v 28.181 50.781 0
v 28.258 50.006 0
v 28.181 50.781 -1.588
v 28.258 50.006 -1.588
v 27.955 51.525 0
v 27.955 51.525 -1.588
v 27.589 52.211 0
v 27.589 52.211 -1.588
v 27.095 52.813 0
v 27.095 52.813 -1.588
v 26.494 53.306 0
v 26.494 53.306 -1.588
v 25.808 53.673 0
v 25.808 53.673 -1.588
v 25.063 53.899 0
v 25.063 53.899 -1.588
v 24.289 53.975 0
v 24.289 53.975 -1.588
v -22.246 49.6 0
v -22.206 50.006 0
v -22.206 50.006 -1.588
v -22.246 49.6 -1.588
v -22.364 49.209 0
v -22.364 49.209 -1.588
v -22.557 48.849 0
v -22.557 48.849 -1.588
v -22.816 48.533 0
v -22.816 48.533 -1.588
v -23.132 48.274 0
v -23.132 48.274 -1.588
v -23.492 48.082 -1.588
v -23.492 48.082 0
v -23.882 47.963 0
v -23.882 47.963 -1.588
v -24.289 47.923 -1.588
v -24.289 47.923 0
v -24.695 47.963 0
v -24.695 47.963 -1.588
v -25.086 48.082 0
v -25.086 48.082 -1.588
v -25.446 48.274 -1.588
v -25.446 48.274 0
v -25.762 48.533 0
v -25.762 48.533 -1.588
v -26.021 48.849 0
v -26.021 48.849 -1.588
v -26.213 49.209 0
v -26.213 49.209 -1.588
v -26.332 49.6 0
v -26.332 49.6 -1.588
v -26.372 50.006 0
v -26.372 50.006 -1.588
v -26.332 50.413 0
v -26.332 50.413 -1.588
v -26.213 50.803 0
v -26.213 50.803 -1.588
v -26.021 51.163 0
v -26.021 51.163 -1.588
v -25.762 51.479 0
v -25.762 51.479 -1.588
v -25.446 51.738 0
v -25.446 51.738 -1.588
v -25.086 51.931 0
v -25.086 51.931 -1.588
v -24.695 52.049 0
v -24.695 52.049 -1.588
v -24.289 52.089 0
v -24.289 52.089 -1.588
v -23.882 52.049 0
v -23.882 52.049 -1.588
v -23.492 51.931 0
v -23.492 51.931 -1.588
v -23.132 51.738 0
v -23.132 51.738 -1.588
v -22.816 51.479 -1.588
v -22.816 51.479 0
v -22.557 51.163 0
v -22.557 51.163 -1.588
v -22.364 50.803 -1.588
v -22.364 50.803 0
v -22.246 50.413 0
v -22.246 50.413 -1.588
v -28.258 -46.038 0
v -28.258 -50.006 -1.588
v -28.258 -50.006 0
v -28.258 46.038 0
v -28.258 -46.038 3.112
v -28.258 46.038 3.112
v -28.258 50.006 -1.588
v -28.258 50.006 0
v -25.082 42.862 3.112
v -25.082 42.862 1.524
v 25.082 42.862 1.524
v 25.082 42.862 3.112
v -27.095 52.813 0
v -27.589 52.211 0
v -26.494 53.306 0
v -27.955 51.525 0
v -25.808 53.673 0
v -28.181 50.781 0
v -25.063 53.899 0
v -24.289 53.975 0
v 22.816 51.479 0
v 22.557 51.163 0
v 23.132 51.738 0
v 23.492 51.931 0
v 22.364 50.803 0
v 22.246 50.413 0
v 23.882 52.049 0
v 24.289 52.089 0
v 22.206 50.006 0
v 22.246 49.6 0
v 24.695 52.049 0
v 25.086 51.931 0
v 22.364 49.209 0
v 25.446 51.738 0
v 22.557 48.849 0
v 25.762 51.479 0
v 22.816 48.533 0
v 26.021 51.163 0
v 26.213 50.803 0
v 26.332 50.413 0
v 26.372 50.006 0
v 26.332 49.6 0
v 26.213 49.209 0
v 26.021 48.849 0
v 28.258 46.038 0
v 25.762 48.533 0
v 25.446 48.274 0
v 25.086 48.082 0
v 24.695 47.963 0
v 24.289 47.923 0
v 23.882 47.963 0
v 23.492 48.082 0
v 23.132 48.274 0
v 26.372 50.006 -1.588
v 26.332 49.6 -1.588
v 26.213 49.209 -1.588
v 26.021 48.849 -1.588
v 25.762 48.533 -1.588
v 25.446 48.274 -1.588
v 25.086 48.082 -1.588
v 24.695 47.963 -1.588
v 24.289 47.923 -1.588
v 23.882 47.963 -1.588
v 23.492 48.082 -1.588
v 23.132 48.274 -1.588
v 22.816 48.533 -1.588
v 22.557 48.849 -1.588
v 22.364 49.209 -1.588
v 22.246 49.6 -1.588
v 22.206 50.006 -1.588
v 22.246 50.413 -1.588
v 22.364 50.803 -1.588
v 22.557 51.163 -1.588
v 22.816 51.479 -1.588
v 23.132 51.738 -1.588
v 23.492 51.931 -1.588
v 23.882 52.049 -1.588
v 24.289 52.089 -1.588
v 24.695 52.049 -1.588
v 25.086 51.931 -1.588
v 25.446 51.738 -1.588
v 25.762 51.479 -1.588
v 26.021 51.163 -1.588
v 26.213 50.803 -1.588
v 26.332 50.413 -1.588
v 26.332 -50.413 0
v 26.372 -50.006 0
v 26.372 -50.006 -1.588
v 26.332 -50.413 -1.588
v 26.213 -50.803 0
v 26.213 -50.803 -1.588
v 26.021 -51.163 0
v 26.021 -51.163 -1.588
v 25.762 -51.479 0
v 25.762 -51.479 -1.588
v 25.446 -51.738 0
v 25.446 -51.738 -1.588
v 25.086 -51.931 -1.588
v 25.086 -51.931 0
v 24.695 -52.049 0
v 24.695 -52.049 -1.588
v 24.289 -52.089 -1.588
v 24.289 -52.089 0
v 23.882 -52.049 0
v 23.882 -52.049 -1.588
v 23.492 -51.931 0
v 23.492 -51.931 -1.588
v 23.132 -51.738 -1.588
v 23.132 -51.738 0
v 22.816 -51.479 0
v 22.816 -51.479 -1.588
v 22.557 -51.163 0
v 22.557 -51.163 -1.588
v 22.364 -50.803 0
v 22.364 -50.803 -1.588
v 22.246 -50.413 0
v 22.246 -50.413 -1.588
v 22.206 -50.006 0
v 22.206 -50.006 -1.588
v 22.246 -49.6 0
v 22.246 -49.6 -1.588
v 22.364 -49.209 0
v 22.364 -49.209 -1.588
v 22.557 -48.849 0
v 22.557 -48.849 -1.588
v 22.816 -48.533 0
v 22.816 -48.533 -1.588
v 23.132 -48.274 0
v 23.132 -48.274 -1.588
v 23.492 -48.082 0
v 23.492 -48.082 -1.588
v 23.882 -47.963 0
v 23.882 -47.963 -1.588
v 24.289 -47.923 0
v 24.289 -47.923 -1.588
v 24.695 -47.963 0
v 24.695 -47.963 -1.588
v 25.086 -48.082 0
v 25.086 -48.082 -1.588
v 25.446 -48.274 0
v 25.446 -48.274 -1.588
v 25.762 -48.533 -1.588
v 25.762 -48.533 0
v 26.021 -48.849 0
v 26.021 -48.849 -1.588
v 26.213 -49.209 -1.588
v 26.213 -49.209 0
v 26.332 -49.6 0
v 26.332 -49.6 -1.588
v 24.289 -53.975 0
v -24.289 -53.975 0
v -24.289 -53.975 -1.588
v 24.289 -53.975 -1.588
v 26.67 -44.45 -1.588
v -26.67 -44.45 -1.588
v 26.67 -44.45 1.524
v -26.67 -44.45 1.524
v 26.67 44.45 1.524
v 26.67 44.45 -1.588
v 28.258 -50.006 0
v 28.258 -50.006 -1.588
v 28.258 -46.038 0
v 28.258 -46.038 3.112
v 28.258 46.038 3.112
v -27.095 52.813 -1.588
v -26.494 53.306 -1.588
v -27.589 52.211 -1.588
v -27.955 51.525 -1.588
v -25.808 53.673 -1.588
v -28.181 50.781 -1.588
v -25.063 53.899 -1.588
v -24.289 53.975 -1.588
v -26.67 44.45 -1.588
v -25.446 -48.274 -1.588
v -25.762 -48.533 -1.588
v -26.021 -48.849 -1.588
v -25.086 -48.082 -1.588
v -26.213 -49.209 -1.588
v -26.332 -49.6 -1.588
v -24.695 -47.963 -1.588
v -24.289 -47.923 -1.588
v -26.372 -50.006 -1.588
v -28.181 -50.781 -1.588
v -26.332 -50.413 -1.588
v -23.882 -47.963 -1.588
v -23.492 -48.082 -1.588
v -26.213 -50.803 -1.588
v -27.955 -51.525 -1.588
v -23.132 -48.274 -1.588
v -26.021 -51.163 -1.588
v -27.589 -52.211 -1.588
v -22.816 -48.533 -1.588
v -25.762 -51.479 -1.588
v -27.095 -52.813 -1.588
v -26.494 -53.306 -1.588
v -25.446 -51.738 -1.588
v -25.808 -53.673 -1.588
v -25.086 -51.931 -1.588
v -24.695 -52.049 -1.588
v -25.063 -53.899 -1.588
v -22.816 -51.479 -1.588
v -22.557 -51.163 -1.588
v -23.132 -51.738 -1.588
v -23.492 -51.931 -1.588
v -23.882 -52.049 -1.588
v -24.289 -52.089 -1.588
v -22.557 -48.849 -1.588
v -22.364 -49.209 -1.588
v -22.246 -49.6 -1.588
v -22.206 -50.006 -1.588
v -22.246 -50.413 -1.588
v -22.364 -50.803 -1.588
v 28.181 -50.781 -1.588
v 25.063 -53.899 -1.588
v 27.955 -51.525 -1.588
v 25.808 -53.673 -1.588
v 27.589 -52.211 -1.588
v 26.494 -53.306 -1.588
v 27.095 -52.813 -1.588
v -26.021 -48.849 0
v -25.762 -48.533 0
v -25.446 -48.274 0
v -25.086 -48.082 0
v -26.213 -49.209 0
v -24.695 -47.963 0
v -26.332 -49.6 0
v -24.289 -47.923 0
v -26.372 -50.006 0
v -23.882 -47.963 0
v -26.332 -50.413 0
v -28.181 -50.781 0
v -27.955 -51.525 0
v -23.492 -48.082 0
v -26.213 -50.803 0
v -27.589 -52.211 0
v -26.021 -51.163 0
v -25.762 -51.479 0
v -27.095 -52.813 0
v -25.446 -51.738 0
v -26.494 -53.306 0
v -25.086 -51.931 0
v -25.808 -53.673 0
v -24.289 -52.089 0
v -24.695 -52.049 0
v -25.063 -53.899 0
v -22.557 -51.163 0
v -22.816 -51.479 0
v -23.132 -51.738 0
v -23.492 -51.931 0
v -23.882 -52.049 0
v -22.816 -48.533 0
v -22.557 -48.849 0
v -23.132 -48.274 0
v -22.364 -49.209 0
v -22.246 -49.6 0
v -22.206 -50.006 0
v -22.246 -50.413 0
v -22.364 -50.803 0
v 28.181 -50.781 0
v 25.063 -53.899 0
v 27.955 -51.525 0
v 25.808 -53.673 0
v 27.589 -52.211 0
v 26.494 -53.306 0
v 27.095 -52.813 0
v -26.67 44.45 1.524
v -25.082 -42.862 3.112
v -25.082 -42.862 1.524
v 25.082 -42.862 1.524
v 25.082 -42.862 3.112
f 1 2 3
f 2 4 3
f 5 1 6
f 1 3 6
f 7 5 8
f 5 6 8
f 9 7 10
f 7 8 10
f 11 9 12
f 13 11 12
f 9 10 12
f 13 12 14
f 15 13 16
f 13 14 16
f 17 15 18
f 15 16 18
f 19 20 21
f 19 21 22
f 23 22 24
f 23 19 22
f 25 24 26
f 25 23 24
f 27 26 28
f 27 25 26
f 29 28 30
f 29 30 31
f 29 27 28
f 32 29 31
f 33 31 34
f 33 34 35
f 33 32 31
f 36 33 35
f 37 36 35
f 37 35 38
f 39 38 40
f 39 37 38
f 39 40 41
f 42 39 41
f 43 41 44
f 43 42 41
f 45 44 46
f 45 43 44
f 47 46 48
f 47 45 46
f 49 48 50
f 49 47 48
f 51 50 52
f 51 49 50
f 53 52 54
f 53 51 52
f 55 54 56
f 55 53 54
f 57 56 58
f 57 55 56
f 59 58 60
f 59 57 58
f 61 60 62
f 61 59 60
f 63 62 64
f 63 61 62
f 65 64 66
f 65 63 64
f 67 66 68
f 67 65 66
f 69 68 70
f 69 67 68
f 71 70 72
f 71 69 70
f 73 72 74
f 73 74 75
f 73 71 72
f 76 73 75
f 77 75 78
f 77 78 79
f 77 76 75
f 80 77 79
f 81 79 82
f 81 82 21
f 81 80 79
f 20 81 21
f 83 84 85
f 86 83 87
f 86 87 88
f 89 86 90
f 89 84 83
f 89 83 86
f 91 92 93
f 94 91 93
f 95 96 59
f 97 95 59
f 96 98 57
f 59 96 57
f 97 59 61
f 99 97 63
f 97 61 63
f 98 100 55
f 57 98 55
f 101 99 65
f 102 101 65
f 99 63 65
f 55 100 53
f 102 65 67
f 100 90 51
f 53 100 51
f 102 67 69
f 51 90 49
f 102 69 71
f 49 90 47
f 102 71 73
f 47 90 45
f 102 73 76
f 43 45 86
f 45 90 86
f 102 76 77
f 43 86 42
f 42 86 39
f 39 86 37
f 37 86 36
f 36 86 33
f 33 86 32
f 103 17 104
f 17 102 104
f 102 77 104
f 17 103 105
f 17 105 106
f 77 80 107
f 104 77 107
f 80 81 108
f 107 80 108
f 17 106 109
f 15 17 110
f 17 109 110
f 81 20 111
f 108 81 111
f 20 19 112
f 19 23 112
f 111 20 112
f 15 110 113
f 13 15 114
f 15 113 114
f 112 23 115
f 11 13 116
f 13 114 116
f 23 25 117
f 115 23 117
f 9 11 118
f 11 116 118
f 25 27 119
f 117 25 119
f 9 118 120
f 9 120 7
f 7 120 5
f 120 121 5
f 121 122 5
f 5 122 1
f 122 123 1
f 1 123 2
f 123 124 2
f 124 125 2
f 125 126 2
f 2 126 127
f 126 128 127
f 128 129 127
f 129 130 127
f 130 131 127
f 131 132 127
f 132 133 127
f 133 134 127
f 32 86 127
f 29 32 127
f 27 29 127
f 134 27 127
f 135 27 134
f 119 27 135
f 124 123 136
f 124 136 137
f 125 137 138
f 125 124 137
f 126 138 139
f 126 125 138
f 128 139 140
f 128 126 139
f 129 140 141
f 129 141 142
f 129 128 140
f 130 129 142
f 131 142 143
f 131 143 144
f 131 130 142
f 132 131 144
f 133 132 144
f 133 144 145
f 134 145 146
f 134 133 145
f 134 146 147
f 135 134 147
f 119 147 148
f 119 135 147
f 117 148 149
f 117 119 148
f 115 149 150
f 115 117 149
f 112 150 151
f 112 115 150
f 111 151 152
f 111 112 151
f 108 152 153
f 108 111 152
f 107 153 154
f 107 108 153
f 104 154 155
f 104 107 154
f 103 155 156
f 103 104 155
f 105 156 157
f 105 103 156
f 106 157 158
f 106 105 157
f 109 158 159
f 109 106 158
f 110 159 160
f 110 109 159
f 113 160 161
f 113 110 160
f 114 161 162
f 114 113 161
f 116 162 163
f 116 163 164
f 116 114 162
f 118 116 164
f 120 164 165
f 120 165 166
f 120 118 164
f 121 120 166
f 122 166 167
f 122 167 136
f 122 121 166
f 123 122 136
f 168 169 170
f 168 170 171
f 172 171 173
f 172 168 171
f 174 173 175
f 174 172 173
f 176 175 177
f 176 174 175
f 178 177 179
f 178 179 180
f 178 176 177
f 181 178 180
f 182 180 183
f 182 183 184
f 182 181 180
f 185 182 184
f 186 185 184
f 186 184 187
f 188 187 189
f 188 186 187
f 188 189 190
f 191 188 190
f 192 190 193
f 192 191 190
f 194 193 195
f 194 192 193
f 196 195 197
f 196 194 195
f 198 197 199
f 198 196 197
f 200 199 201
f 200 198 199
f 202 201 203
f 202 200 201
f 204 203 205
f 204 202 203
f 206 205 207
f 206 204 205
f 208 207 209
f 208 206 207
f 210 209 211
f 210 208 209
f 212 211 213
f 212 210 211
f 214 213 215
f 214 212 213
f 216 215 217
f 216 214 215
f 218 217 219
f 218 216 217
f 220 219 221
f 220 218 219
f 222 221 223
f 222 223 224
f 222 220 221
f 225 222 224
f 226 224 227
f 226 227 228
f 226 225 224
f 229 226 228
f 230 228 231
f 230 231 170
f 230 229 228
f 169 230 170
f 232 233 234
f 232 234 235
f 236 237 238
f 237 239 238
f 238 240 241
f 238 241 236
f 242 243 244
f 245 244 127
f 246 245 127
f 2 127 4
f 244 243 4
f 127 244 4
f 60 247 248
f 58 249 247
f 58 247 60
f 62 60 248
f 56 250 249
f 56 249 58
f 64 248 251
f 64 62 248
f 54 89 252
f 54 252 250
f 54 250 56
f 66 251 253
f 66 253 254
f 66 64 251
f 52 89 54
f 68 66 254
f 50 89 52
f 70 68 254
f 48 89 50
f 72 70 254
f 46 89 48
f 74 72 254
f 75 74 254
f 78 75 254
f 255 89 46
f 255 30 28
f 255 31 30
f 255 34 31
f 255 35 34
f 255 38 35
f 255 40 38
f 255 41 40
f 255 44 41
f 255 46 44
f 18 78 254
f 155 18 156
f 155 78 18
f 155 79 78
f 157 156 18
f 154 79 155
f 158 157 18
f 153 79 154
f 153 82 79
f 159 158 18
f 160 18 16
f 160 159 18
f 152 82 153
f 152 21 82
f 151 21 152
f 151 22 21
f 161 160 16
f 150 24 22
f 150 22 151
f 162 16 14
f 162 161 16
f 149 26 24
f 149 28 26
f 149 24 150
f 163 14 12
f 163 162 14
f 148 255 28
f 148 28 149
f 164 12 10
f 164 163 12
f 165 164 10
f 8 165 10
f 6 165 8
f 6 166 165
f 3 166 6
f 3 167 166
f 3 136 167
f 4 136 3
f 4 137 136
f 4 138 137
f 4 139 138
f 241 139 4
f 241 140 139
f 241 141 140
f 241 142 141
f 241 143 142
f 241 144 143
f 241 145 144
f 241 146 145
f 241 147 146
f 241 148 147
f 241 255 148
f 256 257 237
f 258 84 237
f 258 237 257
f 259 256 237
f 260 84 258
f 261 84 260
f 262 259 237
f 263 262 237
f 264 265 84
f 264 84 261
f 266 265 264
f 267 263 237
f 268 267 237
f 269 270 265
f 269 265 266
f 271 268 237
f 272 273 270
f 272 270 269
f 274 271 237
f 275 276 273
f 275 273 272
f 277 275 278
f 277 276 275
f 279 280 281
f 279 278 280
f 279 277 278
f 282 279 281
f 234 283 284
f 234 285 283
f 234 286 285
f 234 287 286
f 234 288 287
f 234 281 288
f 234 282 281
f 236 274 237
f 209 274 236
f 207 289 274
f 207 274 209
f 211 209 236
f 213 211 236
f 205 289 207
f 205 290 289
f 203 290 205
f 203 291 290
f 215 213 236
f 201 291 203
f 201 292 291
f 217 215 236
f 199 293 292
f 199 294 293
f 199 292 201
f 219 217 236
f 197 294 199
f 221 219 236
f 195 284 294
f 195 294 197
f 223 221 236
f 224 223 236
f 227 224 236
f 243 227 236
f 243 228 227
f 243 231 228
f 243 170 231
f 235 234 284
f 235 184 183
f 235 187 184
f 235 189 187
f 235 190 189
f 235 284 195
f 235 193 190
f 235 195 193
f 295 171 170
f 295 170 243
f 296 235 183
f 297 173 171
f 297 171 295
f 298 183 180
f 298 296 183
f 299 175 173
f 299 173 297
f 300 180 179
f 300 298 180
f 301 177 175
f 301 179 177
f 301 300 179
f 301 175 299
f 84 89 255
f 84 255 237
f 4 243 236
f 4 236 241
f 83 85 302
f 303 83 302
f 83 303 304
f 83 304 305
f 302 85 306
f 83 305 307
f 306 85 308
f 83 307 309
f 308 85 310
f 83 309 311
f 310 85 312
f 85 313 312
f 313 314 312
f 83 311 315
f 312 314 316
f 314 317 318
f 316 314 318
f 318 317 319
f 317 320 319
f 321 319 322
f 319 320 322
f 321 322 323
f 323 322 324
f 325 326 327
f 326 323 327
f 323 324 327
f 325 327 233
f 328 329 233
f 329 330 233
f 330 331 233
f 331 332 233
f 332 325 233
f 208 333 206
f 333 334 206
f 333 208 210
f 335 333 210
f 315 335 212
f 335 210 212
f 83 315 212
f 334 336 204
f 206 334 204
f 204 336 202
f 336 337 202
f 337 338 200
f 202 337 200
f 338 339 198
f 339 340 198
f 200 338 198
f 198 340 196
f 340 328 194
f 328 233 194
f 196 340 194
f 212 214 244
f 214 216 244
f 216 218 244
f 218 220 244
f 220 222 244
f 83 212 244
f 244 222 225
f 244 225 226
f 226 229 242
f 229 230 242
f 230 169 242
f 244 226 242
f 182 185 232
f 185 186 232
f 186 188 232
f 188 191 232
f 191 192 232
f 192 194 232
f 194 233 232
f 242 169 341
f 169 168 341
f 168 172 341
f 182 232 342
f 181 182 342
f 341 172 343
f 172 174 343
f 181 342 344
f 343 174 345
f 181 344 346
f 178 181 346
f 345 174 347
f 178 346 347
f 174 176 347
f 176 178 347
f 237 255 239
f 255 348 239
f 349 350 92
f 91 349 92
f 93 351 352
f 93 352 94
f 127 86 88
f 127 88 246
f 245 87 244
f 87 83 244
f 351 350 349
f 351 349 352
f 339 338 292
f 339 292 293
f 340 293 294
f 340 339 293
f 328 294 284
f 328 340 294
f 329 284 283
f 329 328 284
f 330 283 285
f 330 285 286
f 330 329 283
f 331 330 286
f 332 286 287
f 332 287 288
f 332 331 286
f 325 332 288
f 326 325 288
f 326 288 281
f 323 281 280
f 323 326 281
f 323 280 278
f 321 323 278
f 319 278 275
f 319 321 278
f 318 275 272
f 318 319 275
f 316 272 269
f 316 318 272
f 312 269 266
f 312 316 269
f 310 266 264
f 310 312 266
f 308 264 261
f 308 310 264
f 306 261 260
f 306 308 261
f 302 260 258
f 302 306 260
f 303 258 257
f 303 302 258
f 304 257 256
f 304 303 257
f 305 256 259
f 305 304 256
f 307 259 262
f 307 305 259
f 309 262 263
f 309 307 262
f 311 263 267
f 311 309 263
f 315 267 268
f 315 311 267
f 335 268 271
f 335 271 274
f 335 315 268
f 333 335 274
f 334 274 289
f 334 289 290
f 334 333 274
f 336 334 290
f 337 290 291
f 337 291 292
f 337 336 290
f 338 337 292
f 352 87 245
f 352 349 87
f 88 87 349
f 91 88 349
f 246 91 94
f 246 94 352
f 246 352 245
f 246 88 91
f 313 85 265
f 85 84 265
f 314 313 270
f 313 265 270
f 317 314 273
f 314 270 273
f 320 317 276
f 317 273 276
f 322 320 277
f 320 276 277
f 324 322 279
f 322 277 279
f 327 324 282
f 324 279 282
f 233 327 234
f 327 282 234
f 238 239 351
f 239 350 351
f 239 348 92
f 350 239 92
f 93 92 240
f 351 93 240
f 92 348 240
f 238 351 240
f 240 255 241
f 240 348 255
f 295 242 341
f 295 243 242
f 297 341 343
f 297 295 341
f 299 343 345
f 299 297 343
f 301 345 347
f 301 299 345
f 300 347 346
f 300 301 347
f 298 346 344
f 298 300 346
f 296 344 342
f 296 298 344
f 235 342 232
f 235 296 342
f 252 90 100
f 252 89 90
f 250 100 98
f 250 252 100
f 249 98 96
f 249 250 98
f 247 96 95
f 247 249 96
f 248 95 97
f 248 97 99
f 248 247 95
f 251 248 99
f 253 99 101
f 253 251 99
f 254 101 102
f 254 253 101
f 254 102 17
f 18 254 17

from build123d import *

# Parameters (mm, degrees)
F0_W     = 56.515
F0_H     = 92.075
F0_W_2   = 53.34
F0_H_2   = 88.9
F1_DEPTH = 1.524
F2_W     = 56.515
F2_H     = 107.95
F2_R     = 2.0828
F2_W_2   = 53.34
F2_H_2   = 88.9
F3_DEPTH = 1.5875
F4_W     = 56.515
F4_H     = 92.075
F4_W_2   = 50.165
F4_H_2   = 85.725
F5_DEPTH = 1.5875
F6_R     = 3.96875


with BuildPart() as f1:
    # F0 (on Top) → F1 (new body)
    with BuildSketch(Plane.XY):
        Rectangle(F0_W, F0_H)
        Rectangle(F0_W_2, F0_H_2, mode=Mode.SUBTRACT)
    extrude(amount=F1_DEPTH)

    # F2 (on face) → F3 (join)
    with BuildSketch(Plane(origin=(0, 0, 0), x_dir=(1, 0, 0), z_dir=(0, 0, -1))):
        Rectangle(F2_W, F2_H)
        with Locations((-24.28875, -50.00625)):
            Circle(F2_R, mode=Mode.SUBTRACT)
        with Locations((24.28875, -50.00625)):
            Circle(F2_R, mode=Mode.SUBTRACT)
        with Locations((-24.28875, 50.00625)):
            Circle(F2_R, mode=Mode.SUBTRACT)
        Rectangle(F2_W_2, F2_H_2, mode=Mode.SUBTRACT)
        with Locations((24.28875, 50.00625)):
            Circle(F2_R, mode=Mode.SUBTRACT)
    extrude(amount=F3_DEPTH)

    # F4 (on face) → F5 (join)
    with BuildSketch(Plane.XY.offset(1.524)):
        Rectangle(F4_W, F4_H)
        Rectangle(F4_W_2, F4_H_2, mode=Mode.SUBTRACT)
    extrude(amount=F5_DEPTH)

    # F6
    f6_edges = [f1.edges().sort_by_distance(p)[0] for p in [
        (-28.2575, -53.975, -0.79375),
        (28.2575, -53.975, -0.79375),
        (28.2575, 53.975, -0.79375),
        (-28.2575, 53.975, -0.79375),
    ]]
    fillet(f6_edges, radius=F6_R)


solid = f1.part
